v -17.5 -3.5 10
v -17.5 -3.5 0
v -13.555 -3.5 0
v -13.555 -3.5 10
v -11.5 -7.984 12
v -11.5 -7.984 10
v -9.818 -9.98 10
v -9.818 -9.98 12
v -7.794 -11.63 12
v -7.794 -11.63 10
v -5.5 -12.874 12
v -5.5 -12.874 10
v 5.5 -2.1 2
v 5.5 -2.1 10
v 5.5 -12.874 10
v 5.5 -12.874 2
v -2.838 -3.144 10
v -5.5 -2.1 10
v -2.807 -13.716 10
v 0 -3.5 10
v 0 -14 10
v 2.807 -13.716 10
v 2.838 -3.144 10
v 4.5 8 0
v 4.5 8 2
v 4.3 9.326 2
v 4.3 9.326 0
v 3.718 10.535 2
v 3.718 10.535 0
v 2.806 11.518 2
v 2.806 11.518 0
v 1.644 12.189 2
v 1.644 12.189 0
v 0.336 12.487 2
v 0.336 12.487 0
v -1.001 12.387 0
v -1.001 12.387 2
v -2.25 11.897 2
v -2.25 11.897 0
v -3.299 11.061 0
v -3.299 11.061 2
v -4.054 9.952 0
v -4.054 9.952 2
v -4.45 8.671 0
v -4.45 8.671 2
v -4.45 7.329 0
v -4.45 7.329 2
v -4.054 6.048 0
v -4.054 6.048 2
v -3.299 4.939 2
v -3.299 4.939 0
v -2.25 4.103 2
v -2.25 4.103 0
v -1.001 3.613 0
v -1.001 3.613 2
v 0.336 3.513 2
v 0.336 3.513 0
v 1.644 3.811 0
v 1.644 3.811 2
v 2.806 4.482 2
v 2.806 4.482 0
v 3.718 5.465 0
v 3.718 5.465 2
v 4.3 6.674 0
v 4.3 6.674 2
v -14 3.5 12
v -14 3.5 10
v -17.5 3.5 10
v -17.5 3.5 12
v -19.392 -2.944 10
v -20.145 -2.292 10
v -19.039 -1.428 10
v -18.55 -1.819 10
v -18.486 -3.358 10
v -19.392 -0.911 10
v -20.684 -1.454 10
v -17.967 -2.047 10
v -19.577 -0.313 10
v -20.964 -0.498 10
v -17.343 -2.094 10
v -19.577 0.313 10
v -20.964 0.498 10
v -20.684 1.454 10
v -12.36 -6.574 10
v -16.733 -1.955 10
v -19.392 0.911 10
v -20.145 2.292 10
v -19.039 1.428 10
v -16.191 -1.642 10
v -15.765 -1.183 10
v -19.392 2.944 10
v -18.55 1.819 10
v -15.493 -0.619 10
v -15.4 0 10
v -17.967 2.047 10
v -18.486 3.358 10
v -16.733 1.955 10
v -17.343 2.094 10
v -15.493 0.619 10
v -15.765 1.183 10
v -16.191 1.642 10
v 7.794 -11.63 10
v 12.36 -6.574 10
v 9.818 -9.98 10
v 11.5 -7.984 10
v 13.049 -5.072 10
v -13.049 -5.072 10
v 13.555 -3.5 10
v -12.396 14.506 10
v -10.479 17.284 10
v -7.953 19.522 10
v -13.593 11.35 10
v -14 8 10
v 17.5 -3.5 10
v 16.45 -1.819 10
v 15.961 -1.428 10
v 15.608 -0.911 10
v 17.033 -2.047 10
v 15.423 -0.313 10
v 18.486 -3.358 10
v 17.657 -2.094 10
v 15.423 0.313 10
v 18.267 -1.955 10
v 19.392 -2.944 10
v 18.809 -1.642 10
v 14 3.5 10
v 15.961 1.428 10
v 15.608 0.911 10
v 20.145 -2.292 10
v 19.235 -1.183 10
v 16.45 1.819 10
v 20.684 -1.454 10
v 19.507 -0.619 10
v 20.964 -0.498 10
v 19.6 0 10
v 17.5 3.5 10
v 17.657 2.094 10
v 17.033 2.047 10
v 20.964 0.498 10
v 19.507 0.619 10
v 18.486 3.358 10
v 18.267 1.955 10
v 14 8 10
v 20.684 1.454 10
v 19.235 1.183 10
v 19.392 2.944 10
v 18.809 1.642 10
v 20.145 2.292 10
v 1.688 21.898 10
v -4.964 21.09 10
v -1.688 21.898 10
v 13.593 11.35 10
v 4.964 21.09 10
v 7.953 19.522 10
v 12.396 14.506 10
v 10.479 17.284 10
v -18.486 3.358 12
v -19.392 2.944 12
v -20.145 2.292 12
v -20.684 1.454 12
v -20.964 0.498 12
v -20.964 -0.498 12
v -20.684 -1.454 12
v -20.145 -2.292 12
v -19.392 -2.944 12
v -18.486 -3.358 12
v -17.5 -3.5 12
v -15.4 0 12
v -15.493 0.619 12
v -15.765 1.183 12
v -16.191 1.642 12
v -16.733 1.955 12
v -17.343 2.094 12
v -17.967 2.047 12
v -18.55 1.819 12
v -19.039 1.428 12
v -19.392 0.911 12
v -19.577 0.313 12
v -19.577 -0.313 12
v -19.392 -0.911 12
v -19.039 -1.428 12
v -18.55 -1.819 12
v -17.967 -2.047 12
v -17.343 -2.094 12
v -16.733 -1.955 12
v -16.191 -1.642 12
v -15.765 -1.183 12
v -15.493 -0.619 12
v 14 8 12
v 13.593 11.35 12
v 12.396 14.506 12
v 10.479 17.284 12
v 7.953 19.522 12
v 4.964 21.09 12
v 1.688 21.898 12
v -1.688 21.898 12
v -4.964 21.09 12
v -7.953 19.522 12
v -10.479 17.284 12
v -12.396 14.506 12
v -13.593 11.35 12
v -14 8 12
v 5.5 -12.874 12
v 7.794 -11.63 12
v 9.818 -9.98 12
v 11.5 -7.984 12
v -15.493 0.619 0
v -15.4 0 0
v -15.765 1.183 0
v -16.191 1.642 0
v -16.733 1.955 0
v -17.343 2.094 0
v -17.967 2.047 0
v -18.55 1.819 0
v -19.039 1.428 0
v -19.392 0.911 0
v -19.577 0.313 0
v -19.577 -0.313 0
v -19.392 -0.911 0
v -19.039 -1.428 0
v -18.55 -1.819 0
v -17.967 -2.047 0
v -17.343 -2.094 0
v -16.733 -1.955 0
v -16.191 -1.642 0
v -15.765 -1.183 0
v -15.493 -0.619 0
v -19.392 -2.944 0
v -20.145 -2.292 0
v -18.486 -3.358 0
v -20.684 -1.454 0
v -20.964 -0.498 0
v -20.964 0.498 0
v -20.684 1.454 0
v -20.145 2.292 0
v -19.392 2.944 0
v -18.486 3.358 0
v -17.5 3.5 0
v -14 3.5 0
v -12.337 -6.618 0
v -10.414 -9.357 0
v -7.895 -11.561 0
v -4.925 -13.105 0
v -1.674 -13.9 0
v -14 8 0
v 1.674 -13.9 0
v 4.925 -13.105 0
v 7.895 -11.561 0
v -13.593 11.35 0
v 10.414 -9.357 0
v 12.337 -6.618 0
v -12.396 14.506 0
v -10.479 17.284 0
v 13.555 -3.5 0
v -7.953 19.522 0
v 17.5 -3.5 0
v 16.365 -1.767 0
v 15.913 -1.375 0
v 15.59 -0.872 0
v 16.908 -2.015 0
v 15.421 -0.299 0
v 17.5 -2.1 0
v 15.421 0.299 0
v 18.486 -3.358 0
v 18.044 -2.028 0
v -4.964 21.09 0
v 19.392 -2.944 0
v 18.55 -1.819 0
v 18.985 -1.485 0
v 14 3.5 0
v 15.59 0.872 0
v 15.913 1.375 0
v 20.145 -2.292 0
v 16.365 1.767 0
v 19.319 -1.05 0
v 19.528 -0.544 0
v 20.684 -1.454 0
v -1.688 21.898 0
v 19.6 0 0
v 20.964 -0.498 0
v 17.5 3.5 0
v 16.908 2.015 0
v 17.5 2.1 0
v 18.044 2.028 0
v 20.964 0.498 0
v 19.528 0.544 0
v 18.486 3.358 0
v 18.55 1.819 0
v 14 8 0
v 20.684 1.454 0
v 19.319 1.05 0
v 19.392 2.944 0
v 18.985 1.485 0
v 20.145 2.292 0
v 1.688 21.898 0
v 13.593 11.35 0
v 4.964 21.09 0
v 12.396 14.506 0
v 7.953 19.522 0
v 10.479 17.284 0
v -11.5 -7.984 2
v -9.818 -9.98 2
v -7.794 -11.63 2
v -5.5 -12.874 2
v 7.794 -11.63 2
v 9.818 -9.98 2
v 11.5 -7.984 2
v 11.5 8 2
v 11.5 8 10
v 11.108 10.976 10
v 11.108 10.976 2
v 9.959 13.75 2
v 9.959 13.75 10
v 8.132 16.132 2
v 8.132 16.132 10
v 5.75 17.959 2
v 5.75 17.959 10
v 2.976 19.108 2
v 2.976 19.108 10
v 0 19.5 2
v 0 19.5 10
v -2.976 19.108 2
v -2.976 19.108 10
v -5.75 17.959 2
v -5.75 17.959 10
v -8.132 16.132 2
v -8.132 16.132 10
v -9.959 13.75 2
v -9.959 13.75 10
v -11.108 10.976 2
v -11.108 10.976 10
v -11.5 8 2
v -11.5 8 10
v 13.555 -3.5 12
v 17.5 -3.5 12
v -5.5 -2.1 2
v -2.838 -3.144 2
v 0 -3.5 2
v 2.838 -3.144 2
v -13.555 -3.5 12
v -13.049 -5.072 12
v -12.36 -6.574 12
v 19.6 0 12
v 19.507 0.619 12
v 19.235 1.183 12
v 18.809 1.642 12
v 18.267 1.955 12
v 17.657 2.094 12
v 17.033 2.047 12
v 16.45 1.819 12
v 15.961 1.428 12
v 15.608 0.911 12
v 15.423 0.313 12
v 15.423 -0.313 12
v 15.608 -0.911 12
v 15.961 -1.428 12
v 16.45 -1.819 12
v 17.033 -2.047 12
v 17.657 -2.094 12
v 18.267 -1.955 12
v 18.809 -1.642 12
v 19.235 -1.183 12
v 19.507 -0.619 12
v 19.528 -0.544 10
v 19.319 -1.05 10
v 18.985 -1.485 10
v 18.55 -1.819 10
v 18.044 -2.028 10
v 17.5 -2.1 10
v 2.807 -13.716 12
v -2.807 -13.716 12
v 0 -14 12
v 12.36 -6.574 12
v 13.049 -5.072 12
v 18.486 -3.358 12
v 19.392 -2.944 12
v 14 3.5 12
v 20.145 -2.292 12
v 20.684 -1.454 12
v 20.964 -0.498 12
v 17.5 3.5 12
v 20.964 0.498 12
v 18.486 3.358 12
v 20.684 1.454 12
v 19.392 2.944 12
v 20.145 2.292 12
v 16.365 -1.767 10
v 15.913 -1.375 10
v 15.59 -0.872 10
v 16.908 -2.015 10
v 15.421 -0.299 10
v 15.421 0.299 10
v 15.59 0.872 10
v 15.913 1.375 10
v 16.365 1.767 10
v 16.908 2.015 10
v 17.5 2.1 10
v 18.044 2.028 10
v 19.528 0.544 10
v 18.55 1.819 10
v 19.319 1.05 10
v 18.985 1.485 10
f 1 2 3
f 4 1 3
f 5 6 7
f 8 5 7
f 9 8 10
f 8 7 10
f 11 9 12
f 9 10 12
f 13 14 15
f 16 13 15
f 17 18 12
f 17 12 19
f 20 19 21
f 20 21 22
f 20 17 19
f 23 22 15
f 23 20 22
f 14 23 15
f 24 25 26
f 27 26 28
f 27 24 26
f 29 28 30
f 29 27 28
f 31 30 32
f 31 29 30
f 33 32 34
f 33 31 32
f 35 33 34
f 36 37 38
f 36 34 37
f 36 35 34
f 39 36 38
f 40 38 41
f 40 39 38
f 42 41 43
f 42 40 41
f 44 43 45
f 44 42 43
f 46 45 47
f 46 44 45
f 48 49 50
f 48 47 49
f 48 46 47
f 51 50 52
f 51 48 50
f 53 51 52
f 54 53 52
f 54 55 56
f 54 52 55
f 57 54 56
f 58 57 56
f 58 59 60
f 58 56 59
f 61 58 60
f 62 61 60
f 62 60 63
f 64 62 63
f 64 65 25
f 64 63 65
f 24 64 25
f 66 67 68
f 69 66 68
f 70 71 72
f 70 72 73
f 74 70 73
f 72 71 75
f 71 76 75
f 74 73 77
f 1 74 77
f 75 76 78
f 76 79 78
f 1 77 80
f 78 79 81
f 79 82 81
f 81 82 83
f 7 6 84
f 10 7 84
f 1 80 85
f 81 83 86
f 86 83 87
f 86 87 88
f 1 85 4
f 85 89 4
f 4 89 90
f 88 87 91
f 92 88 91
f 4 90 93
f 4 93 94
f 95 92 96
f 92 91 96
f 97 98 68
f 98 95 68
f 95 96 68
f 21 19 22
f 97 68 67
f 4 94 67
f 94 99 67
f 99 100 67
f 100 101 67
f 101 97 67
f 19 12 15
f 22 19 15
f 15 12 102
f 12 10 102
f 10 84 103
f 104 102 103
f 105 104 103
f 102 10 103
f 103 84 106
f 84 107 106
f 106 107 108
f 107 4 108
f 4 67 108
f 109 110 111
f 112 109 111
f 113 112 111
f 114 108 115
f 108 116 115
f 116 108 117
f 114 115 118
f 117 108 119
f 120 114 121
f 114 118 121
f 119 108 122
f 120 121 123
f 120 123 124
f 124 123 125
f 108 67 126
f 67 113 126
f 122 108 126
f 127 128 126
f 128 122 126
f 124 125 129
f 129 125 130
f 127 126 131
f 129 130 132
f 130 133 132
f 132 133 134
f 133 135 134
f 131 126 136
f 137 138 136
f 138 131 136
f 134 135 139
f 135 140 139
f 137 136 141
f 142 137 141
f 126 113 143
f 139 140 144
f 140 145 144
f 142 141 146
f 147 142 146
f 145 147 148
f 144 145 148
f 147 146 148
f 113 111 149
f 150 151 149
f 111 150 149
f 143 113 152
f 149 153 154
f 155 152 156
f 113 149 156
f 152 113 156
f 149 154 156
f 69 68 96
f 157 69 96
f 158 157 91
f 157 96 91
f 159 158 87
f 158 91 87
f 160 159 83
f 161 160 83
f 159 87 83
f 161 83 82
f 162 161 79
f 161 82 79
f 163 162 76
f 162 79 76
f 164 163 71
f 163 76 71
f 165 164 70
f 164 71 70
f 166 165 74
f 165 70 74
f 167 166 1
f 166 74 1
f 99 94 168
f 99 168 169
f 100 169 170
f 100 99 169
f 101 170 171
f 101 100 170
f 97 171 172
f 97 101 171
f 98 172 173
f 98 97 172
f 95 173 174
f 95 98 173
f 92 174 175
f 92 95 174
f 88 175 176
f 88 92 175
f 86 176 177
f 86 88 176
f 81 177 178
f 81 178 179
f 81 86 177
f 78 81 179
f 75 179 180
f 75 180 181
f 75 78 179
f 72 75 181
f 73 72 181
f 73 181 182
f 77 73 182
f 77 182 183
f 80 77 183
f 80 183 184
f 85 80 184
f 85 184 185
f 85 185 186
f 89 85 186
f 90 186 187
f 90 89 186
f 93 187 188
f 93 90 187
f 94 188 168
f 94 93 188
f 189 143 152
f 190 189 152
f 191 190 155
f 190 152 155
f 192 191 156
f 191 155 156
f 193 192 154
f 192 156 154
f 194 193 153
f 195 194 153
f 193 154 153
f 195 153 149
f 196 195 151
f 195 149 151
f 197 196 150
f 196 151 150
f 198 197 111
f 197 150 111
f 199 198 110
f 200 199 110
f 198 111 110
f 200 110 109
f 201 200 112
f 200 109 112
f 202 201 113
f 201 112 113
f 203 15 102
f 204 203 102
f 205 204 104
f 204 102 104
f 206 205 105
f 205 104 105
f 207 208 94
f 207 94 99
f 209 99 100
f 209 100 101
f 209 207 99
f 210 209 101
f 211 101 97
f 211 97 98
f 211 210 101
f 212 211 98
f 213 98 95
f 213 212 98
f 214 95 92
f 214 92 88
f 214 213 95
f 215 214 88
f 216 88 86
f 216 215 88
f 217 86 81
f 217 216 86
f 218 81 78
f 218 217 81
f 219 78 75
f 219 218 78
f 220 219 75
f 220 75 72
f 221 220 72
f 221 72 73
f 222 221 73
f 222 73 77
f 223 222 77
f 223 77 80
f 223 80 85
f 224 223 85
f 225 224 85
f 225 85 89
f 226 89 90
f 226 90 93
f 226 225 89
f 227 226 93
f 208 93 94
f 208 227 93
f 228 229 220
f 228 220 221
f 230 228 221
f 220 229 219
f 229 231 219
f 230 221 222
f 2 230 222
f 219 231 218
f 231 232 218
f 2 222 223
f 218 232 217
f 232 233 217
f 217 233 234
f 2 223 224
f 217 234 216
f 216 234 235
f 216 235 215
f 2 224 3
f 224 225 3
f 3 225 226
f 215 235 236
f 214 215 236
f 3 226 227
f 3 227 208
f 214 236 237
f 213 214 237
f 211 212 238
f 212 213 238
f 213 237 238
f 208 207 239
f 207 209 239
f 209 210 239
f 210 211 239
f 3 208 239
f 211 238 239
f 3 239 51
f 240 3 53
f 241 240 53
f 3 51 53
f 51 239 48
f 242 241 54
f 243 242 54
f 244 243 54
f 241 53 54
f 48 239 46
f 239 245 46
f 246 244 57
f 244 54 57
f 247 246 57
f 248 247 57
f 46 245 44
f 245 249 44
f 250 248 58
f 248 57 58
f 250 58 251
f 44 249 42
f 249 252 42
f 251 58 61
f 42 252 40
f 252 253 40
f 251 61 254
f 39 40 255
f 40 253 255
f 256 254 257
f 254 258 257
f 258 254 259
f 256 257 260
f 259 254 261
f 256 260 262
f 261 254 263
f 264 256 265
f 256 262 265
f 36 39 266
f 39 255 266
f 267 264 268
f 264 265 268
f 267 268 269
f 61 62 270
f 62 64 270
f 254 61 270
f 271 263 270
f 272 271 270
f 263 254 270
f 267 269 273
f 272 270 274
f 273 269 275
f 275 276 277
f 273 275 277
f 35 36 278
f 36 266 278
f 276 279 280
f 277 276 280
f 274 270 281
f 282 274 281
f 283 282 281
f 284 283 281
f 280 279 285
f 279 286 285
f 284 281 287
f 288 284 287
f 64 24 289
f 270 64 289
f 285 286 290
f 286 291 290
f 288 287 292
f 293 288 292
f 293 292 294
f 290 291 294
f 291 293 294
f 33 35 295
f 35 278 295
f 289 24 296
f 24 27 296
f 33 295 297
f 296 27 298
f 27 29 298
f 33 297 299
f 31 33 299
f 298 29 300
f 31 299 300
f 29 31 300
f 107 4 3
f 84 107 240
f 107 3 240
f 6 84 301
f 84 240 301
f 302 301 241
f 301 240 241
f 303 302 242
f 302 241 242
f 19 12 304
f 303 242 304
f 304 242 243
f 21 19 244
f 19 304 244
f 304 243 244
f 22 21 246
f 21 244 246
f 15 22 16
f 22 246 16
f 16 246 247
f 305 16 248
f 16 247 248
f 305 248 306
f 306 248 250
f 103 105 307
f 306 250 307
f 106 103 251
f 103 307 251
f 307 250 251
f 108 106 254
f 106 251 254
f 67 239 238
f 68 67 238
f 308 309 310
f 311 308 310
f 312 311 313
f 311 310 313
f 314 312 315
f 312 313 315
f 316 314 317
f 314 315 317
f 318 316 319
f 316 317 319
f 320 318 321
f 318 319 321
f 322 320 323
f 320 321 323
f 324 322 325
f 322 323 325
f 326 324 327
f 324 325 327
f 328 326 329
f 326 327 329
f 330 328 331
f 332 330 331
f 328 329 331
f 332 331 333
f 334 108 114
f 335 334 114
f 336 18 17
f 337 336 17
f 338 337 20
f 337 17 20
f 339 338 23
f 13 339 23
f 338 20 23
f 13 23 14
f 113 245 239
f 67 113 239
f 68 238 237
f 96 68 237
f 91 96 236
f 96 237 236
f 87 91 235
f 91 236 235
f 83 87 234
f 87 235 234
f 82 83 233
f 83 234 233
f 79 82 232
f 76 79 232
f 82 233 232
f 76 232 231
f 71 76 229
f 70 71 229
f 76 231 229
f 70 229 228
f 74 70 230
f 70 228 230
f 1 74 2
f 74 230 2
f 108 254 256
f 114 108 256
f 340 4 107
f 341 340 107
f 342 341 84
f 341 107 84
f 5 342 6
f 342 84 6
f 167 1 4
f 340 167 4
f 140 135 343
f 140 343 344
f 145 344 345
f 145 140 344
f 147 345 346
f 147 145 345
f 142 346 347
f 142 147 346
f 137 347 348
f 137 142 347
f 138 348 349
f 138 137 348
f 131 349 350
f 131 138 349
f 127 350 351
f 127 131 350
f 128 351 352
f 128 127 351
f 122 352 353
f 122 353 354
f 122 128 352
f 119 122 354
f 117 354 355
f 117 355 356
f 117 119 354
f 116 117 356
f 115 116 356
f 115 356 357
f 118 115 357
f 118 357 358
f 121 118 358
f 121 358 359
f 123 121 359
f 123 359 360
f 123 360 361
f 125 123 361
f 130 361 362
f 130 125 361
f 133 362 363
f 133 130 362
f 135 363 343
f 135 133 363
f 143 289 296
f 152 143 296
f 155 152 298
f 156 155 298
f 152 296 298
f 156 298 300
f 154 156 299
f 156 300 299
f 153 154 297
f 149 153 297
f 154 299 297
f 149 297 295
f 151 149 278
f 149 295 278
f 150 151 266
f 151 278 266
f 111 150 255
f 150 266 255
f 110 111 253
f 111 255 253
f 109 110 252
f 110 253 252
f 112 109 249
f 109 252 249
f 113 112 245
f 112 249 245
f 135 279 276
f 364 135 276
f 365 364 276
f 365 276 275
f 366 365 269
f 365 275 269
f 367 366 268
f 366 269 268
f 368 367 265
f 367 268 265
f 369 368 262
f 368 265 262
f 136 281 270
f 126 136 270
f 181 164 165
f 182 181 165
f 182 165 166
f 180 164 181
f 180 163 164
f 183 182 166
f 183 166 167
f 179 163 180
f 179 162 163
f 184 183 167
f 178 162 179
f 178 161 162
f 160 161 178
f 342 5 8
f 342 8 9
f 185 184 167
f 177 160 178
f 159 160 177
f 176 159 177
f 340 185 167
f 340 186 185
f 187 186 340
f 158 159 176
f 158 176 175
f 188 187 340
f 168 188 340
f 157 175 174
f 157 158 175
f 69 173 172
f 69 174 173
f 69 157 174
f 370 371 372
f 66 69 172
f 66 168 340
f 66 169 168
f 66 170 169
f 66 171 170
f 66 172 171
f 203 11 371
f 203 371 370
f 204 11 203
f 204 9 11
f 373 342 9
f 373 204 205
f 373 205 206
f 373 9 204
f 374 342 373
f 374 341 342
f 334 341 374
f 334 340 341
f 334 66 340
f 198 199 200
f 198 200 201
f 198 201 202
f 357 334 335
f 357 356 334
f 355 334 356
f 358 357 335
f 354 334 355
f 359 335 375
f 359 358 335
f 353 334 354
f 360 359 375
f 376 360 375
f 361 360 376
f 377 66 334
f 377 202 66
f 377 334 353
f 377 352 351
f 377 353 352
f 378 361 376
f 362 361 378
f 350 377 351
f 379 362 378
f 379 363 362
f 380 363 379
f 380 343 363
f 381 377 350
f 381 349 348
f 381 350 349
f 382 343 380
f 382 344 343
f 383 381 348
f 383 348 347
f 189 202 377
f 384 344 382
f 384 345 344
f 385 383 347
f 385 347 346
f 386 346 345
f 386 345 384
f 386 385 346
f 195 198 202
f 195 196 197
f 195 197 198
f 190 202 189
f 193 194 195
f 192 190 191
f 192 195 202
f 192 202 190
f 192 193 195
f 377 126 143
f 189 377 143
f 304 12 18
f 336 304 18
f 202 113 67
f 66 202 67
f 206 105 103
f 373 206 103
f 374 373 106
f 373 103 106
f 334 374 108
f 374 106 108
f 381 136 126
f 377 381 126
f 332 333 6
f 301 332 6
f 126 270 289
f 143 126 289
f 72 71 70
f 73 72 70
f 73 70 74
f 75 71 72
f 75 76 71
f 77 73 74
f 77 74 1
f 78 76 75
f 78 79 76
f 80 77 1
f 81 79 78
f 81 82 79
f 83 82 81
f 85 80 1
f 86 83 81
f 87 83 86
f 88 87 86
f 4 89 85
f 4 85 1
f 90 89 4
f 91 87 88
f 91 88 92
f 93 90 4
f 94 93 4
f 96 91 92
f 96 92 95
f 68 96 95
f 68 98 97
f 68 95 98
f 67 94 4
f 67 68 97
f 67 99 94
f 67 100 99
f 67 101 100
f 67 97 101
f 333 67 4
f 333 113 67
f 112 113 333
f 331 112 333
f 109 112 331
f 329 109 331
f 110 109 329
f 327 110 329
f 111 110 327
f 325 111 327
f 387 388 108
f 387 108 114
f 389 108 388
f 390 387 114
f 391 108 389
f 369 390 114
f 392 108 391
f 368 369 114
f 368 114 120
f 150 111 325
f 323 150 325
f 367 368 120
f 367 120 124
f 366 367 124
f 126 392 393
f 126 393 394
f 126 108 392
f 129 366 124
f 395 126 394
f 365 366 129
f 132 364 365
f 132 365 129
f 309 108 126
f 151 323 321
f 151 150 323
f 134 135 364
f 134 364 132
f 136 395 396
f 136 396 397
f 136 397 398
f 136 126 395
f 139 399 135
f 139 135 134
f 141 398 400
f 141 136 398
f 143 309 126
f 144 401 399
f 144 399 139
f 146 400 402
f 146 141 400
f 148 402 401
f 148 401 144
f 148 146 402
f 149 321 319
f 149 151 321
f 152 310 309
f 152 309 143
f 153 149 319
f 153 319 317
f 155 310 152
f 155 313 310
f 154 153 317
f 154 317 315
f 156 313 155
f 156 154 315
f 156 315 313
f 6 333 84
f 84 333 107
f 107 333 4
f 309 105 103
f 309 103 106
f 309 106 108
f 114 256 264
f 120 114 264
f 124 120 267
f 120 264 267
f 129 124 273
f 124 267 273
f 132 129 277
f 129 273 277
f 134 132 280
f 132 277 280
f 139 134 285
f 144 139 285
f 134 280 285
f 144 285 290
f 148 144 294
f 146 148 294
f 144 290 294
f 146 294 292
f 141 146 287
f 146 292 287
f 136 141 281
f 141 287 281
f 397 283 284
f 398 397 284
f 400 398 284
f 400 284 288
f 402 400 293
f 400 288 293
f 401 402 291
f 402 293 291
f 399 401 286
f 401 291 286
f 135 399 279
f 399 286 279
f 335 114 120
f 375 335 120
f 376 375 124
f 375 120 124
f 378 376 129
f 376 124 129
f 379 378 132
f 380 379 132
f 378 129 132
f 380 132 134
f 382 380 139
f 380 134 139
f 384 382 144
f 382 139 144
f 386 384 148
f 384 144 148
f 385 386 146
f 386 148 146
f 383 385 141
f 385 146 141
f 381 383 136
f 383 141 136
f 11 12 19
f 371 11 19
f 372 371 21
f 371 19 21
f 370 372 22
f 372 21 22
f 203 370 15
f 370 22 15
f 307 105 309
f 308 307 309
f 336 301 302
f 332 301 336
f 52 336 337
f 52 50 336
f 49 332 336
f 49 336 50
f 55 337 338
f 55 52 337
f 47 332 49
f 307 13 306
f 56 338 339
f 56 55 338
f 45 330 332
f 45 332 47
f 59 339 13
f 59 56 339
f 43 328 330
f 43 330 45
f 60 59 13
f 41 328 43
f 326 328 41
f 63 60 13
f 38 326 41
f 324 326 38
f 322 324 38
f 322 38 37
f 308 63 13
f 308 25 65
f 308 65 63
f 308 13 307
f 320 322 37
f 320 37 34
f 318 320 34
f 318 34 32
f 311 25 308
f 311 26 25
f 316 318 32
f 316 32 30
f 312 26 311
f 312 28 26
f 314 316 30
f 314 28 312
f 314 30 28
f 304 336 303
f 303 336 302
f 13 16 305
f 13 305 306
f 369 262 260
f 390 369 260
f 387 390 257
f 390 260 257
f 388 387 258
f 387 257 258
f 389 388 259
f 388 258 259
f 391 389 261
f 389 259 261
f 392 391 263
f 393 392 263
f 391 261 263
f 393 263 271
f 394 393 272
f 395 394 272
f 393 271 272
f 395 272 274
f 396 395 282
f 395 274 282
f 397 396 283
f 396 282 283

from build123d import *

# Parameters (mm, degrees)
F0_R     = 2.1
F0_R_2   = 4.5
F1_DEPTH = 10
F3_DEPTH = 8
F4_R     = 2.1
F5_DEPTH = 2


with BuildPart() as f1:
    # F0 (on Top) → F1 (new body)
    with BuildSketch(Plane.XY):
        with BuildLine():
            Line((13.555442, -3.5), (-13.555442, -3.5))
            ThreePointArc((-13.555442, -3.5), (0, -14), (13.555442, -3.5))
        make_face()
        with BuildLine():
            Line((-17.5, -3.5), (-13.555442, -3.5))
            Line((-13.555442, -3.5), (13.555442, -3.5))
            Line((13.555442, -3.5), (17.5, -3.5))
            Line((17.5, -3.5), (17.5, -2.1))
            ThreePointArc((17.5, -2.1), (15.4, 0), (17.5, 2.1))
            Line((17.5, 2.1), (17.5, 3.5))
            Line((17.5, 3.5), (14, 3.5))
            Line((14, 3.5), (14, 8))
            ThreePointArc((14, 8), (0, 22), (-14, 8))
            Line((-14, 8), (-14, 3.5))
            Line((-14, 3.5), (-17.5, 3.5))
            ThreePointArc((-17.5, 3.5), (-21, 0), (-17.5, -3.5))
        make_face()
        with Locations((-17.5, 0)):
            Circle(F0_R, mode=Mode.SUBTRACT)
        with Locations((0, 8)):
            Circle(F0_R_2, mode=Mode.SUBTRACT)
        with BuildLine():
            Line((17.5, -2.1), (17.5, -3.5))
            ThreePointArc((17.5, -3.5), (21, 0), (17.5, 3.5))
            Line((17.5, 3.5), (17.5, 2.1))
            ThreePointArc((17.5, 2.1), (18.984924, 1.484924), (19.6, 0))
            ThreePointArc((19.6, 0), (18.984924, -1.484924), (17.5, -2.1))
        make_face()
    extrude(amount=F1_DEPTH)

    # F2 (on face) → F3 (cut)
    with BuildSketch(Plane.XY.offset(10)):
        with BuildLine():
            Line((-5.5, 8), (-5.5, -2.099505))
            ThreePointArc((-5.5, -2.099505), (0, -3.5), (5.5, -2.099505))
            Line((5.5, -2.099505), (5.5, 8))
            Line((5.5, 8), (11.5, 8))
            ThreePointArc((11.5, 8), (0, 19.5), (-11.5, 8))
            Line((-11.5, 8), (-5.5, 8))
        make_face()
        Polygon((-5.5, -12.874393), (-5.5, -2.099505), (-5.5, 8), (-11.5, 8), (-11.5, -12.874393), align=None)
        Polygon((5.5, 8), (5.5, -2.099505), (5.5, -12.874393), (11.5, -12.874393), (11.5, 8), align=None)
    extrude(amount=-F3_DEPTH, mode=Mode.SUBTRACT)


with BuildPart() as f5:
    # F4 (on face) → F5 (new body)
    with BuildSketch(Plane.XY.offset(10)):
        with BuildLine():
            Line((13.555442, -3.5), (17.5, -3.5))
            ThreePointArc((17.5, -3.5), (21, 0), (17.5, 3.5))
            Line((17.5, 3.5), (14, 3.5))
            Line((14, 3.5), (14, 8))
            ThreePointArc((14, 8), (0, 22), (-14, 8))
            Line((-14, 8), (-14, 3.5))
            Line((-14, 3.5), (-17.5, 3.5))
            ThreePointArc((-17.5, 3.5), (-21, 0), (-17.5, -3.5))
            Line((-17.5, -3.5), (-13.555442, -3.5))
            ThreePointArc((-13.555442, -3.5), (-12.726789, -5.833424), (-11.5, -7.98436))
            ThreePointArc((-11.5, -7.98436), (-8.844665, -10.852276), (-5.5, -12.874393))
            ThreePointArc((-5.5, -12.874393), (0, -14), (5.5, -12.874393))
            ThreePointArc((5.5, -12.874393), (8.844665, -10.852276), (11.5, -7.98436))
            ThreePointArc((11.5, -7.98436), (12.726789, -5.833424), (13.555442, -3.5))
        make_face()
        with Locations((-17.5, 0)):
            Circle(F4_R, mode=Mode.SUBTRACT)
        with Locations((17.5, 0)):
            Circle(F4_R, mode=Mode.SUBTRACT)
    extrude(amount=F5_DEPTH)


solid = Compound([f1.part, f5.part])
